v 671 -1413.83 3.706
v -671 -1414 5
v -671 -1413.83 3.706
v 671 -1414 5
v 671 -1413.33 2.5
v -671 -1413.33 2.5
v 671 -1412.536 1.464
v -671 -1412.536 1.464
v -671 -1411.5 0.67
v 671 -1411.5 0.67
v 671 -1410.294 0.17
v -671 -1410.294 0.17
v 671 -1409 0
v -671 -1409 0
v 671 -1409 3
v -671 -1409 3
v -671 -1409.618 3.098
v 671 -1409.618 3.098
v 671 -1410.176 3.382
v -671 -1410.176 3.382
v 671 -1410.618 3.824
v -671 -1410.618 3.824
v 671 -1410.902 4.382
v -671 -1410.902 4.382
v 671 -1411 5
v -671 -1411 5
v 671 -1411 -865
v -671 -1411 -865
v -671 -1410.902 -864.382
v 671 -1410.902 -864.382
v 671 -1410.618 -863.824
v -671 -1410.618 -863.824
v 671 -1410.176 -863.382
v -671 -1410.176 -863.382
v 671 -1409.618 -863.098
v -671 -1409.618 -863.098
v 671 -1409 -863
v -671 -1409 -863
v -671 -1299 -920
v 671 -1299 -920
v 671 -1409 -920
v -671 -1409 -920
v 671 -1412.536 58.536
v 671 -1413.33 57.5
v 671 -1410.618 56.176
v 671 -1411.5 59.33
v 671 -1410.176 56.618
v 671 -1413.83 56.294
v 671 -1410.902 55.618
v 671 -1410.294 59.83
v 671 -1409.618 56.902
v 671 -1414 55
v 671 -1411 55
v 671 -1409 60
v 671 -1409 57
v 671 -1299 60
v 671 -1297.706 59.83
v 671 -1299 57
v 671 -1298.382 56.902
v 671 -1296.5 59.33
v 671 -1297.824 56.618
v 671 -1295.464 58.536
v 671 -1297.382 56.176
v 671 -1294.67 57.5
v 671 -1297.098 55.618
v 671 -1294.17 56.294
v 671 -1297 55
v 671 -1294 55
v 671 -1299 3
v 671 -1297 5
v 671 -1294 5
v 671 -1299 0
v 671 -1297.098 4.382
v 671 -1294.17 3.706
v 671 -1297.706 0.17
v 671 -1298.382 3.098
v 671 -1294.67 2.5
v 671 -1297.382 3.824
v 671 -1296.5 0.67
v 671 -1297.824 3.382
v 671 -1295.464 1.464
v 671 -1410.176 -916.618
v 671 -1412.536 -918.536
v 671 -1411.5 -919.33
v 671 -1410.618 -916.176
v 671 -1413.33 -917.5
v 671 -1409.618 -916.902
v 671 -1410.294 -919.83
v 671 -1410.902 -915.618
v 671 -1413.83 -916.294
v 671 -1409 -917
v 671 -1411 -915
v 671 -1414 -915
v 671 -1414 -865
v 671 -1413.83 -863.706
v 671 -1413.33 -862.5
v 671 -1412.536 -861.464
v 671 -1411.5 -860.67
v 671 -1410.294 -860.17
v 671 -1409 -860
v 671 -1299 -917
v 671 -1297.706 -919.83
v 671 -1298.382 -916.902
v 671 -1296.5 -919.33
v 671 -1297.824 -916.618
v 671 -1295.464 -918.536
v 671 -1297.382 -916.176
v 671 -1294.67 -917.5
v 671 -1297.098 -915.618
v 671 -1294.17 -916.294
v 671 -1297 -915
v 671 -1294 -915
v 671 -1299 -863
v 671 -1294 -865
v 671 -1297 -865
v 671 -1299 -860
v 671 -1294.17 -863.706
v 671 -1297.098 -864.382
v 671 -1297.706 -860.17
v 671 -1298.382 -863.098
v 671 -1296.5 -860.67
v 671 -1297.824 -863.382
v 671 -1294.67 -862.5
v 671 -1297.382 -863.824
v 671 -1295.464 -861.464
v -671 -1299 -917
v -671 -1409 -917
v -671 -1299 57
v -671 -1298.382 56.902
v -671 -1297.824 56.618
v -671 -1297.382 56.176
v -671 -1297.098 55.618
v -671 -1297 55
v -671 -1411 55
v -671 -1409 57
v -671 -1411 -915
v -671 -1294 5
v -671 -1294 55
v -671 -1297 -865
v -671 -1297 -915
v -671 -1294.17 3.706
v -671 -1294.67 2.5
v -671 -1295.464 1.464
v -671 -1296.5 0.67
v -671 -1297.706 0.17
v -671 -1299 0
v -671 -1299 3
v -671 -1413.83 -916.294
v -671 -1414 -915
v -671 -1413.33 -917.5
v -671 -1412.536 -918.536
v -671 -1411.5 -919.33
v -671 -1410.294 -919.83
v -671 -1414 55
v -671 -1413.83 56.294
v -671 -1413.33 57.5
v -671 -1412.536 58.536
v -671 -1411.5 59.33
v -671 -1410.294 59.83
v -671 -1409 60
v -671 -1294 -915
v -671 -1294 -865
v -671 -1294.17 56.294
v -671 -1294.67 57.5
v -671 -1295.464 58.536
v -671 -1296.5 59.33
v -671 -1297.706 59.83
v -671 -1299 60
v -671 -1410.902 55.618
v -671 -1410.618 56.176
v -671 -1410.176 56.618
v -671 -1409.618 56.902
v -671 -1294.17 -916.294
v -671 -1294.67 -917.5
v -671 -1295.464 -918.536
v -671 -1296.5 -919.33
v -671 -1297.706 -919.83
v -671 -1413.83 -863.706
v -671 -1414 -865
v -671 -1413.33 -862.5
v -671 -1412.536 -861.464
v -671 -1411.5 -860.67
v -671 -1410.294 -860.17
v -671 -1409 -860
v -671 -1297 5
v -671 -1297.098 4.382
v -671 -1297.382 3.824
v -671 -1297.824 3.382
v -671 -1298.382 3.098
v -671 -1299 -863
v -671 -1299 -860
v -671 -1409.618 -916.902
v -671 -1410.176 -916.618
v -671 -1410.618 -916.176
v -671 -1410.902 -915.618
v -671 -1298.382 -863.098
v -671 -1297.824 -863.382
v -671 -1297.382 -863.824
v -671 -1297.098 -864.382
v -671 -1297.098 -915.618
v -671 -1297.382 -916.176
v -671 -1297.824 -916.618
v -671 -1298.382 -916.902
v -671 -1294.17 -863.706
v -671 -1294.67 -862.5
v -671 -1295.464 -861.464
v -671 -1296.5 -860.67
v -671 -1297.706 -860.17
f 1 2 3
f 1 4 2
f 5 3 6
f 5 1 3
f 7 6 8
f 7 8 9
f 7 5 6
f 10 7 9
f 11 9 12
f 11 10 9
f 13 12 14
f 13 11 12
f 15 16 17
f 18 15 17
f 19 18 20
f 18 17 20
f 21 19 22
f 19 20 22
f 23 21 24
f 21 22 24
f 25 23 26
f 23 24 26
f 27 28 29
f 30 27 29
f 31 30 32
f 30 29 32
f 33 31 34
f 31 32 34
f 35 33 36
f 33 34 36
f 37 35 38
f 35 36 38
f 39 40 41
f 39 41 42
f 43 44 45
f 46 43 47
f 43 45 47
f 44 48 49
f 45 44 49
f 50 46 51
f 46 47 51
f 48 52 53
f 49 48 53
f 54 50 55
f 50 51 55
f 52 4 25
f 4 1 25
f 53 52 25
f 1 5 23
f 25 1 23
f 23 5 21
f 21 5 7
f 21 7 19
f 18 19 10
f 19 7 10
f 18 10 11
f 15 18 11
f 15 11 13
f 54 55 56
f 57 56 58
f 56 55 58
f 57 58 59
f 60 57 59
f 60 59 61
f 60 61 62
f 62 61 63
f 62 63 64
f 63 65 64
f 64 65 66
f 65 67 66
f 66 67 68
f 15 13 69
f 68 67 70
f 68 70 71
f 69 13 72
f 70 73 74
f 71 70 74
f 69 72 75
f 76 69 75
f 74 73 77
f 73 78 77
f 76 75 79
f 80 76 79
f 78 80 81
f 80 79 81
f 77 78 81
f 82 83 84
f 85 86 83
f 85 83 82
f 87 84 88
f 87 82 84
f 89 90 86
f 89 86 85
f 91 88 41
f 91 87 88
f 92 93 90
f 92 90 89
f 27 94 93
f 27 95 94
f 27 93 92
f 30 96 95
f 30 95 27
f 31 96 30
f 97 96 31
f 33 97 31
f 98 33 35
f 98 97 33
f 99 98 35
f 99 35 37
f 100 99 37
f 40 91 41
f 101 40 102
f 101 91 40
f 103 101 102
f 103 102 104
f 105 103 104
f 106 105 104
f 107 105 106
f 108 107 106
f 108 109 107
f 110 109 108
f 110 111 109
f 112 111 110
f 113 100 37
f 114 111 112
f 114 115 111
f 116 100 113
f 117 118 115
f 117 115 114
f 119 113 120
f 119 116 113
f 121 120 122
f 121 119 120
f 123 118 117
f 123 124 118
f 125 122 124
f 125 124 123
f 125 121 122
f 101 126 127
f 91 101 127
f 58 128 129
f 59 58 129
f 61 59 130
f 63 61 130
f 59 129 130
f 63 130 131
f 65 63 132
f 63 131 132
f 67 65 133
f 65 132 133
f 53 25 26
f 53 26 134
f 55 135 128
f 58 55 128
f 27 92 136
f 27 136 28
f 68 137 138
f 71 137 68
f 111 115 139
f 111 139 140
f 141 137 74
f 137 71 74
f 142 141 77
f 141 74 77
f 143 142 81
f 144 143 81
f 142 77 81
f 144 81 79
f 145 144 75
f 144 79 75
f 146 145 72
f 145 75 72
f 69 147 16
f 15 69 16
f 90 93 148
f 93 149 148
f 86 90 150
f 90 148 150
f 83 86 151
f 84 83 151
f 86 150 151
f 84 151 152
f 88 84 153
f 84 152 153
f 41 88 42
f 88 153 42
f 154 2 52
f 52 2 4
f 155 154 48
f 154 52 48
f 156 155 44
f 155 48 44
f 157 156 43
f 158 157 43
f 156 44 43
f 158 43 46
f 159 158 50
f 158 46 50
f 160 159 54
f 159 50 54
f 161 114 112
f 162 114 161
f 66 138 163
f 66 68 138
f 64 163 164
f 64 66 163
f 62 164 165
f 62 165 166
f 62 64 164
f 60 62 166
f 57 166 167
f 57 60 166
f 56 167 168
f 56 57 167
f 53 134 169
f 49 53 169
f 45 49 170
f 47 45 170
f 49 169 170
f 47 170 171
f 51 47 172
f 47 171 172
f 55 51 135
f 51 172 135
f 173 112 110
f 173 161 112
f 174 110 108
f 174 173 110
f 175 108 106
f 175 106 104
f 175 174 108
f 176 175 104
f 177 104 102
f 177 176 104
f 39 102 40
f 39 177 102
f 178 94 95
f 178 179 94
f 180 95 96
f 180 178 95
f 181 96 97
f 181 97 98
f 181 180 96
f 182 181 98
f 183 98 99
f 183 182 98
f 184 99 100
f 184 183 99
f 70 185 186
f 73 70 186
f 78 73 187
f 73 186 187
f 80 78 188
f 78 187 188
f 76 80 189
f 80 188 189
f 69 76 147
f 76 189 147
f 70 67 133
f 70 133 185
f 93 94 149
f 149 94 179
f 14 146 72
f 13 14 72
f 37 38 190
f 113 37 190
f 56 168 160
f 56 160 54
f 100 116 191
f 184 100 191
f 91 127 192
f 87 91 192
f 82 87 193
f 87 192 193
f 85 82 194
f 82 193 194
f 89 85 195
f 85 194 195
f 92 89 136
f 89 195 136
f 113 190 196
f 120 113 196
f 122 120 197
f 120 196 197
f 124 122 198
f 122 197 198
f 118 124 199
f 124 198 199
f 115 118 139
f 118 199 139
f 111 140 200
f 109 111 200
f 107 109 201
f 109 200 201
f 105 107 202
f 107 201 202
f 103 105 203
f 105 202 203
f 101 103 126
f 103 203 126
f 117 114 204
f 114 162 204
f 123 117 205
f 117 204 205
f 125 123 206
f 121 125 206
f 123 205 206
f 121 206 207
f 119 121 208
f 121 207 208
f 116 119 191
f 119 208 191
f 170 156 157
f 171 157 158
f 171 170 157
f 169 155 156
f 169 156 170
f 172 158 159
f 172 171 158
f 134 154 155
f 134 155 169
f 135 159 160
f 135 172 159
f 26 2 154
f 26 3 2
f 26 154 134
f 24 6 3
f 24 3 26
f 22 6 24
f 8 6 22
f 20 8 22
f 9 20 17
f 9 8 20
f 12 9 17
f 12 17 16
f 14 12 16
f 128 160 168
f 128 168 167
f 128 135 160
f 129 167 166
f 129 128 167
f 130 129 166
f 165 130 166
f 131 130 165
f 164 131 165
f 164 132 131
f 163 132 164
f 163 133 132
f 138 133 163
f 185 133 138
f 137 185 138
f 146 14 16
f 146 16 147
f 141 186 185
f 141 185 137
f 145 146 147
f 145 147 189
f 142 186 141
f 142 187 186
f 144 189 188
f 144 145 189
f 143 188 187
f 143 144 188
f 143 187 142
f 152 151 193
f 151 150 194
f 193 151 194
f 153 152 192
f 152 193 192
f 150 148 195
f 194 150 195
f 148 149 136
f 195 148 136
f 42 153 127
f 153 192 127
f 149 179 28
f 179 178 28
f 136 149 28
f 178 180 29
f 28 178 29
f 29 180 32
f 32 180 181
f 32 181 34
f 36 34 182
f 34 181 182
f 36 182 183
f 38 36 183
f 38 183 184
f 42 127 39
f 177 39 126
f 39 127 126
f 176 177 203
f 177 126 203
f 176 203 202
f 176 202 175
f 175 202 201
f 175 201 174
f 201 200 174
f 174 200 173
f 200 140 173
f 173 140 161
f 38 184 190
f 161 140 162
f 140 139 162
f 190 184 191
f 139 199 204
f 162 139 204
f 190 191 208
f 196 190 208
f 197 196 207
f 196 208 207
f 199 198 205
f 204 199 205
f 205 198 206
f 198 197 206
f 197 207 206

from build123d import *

# Parameters (mm, degrees)
SKETCH1_W           = 1342
SKETCH1_H           = 120
BOSS_EXTRUDE1_DEPTH = 60
SKETCH4_W           = 1342
SKETCH4_H           = 120
BOSS_EXTRUDE2_DEPTH = 60
FILLET2_R           = 5
FILLET3_R           = 5
SHELL1_START        = -668
SHELL1_DEPTH        = 1336
SHELL2_START        = -668
SHELL2_DEPTH        = 1336
CUT_EXTRUDE2_DEPTH  = 2156.634477364


# Read off the part's stored shape, not the designer's step: Shell1, Shell2
with BuildPart() as part:
    # Sketch1 → Boss-Extrude1 (new body)
    with BuildSketch(Plane.XY):
        with Locations((0, -1354)):
            Rectangle(SKETCH1_W, SKETCH1_H)
    extrude(amount=BOSS_EXTRUDE1_DEPTH)

    # Fillet3
    fillet3_edges = [part.edges().sort_by_distance(p)[0] for p in [
        (0, -1414, 60),
        (0, -1414, 0),
        (0, -1294, 0),
        (0, -1294, 60),
    ]]
    fillet(fillet3_edges, radius=FILLET3_R)

    # Shell1 outline → Shell1 (cut)
    with BuildSketch(Plane.YZ.offset(SHELL1_START)):
        with BuildLine():
            Line((-1297, 5), (-1297, 55))
            ThreePointArc((-1297, 55), (-1297.585786438, 56.414213562), (-1299, 57))
            Line((-1299, 57), (-1409, 57))
            ThreePointArc((-1409, 57), (-1410.414213562, 56.414213562), (-1411, 55))
            Line((-1411, 55), (-1411, 5))
            ThreePointArc((-1411, 5), (-1410.414213562, 3.585786438), (-1409, 3))
            Line((-1409, 3), (-1299, 3))
            ThreePointArc((-1299, 3), (-1297.585786438, 3.585786438), (-1297, 5))
        make_face()
    extrude(amount=SHELL1_DEPTH, mode=Mode.SUBTRACT)


with BuildPart() as body_2:
    # Sketch4 → Boss-Extrude2 (new body)
    with BuildSketch(Plane(origin=(0, 0, -860), x_dir=(-1, 0, 0), z_dir=(0, 0, -1))):
        with Locations((0, -1354)):
            Rectangle(SKETCH4_W, SKETCH4_H)
    extrude(amount=BOSS_EXTRUDE2_DEPTH)

    # Fillet2
    fillet2_edges = [body_2.edges().sort_by_distance(p)[0] for p in [
        (0, -1414, -920),
        (0, -1294, -920),
        (0, -1414, -860),
        (0, -1294, -860),
    ]]
    fillet(fillet2_edges, radius=FILLET2_R)

    # Shell2 outline → Shell2 (cut)
    with BuildSketch(Plane.YZ.offset(SHELL2_START)):
        with BuildLine():
            Line((-1297, -915), (-1297, -865))
            ThreePointArc((-1297, -865), (-1297.585786438, -863.585786438), (-1299, -863))
            Line((-1299, -863), (-1409, -863))
            ThreePointArc((-1409, -863), (-1410.414213562, -863.585786438), (-1411, -865))
            Line((-1411, -865), (-1411, -915))
            ThreePointArc((-1411, -915), (-1410.414213562, -916.414213562), (-1409, -917))
            Line((-1409, -917), (-1299, -917))
            ThreePointArc((-1299, -917), (-1297.585786438, -916.414213562), (-1297, -915))
        make_face()
    extrude(amount=SHELL2_DEPTH, mode=Mode.SUBTRACT)


with BuildPart() as cut_extrude2_tool:
    # Sketch3 → Cut-Extrude2 (new, through all)
    with BuildSketch(Plane.ZY.offset(671)):
        with BuildLine():
            Line((5, -1411), (55, -1411))
            ThreePointArc((55, -1411), (56.414213562, -1410.414213562), (57, -1409))
            Line((57, -1409), (57, -1299))
            ThreePointArc((57, -1299), (56.414213562, -1297.585786438), (55, -1297))
            Line((55, -1297), (5, -1297))
            ThreePointArc((5, -1297), (3.585786438, -1297.585786438), (3, -1299))
            Line((3, -1299), (3, -1409))
            ThreePointArc((3, -1409), (3.585786438, -1410.414213562), (5, -1411))
        make_face()
        with BuildLine():
            Line((-915, -1411), (-865, -1411))
            ThreePointArc((-865, -1411), (-863.585786438, -1410.414213562), (-863, -1409))
            Line((-863, -1409), (-863, -1299))
            ThreePointArc((-863, -1299), (-863.585786438, -1297.585786438), (-865, -1297))
            Line((-865, -1297), (-915, -1297))
            ThreePointArc((-915, -1297), (-916.414213562, -1297.585786438), (-917, -1299))
            Line((-917, -1299), (-917, -1409))
            ThreePointArc((-917, -1409), (-916.414213562, -1410.414213562), (-915, -1411))
        make_face()
    extrude(amount=-CUT_EXTRUDE2_DEPTH)


with BuildPart() as part_1:
    add(part.part)

    # Cut-Extrude2: cut by cut_extrude2_tool
    add(cut_extrude2_tool.part, mode=Mode.SUBTRACT)


with BuildPart() as body_2_1:
    add(body_2.part)

    # Cut-Extrude2: cut by cut_extrude2_tool
    add(cut_extrude2_tool.part, mode=Mode.SUBTRACT)


solid = Compound([part_1.part, body_2_1.part])
